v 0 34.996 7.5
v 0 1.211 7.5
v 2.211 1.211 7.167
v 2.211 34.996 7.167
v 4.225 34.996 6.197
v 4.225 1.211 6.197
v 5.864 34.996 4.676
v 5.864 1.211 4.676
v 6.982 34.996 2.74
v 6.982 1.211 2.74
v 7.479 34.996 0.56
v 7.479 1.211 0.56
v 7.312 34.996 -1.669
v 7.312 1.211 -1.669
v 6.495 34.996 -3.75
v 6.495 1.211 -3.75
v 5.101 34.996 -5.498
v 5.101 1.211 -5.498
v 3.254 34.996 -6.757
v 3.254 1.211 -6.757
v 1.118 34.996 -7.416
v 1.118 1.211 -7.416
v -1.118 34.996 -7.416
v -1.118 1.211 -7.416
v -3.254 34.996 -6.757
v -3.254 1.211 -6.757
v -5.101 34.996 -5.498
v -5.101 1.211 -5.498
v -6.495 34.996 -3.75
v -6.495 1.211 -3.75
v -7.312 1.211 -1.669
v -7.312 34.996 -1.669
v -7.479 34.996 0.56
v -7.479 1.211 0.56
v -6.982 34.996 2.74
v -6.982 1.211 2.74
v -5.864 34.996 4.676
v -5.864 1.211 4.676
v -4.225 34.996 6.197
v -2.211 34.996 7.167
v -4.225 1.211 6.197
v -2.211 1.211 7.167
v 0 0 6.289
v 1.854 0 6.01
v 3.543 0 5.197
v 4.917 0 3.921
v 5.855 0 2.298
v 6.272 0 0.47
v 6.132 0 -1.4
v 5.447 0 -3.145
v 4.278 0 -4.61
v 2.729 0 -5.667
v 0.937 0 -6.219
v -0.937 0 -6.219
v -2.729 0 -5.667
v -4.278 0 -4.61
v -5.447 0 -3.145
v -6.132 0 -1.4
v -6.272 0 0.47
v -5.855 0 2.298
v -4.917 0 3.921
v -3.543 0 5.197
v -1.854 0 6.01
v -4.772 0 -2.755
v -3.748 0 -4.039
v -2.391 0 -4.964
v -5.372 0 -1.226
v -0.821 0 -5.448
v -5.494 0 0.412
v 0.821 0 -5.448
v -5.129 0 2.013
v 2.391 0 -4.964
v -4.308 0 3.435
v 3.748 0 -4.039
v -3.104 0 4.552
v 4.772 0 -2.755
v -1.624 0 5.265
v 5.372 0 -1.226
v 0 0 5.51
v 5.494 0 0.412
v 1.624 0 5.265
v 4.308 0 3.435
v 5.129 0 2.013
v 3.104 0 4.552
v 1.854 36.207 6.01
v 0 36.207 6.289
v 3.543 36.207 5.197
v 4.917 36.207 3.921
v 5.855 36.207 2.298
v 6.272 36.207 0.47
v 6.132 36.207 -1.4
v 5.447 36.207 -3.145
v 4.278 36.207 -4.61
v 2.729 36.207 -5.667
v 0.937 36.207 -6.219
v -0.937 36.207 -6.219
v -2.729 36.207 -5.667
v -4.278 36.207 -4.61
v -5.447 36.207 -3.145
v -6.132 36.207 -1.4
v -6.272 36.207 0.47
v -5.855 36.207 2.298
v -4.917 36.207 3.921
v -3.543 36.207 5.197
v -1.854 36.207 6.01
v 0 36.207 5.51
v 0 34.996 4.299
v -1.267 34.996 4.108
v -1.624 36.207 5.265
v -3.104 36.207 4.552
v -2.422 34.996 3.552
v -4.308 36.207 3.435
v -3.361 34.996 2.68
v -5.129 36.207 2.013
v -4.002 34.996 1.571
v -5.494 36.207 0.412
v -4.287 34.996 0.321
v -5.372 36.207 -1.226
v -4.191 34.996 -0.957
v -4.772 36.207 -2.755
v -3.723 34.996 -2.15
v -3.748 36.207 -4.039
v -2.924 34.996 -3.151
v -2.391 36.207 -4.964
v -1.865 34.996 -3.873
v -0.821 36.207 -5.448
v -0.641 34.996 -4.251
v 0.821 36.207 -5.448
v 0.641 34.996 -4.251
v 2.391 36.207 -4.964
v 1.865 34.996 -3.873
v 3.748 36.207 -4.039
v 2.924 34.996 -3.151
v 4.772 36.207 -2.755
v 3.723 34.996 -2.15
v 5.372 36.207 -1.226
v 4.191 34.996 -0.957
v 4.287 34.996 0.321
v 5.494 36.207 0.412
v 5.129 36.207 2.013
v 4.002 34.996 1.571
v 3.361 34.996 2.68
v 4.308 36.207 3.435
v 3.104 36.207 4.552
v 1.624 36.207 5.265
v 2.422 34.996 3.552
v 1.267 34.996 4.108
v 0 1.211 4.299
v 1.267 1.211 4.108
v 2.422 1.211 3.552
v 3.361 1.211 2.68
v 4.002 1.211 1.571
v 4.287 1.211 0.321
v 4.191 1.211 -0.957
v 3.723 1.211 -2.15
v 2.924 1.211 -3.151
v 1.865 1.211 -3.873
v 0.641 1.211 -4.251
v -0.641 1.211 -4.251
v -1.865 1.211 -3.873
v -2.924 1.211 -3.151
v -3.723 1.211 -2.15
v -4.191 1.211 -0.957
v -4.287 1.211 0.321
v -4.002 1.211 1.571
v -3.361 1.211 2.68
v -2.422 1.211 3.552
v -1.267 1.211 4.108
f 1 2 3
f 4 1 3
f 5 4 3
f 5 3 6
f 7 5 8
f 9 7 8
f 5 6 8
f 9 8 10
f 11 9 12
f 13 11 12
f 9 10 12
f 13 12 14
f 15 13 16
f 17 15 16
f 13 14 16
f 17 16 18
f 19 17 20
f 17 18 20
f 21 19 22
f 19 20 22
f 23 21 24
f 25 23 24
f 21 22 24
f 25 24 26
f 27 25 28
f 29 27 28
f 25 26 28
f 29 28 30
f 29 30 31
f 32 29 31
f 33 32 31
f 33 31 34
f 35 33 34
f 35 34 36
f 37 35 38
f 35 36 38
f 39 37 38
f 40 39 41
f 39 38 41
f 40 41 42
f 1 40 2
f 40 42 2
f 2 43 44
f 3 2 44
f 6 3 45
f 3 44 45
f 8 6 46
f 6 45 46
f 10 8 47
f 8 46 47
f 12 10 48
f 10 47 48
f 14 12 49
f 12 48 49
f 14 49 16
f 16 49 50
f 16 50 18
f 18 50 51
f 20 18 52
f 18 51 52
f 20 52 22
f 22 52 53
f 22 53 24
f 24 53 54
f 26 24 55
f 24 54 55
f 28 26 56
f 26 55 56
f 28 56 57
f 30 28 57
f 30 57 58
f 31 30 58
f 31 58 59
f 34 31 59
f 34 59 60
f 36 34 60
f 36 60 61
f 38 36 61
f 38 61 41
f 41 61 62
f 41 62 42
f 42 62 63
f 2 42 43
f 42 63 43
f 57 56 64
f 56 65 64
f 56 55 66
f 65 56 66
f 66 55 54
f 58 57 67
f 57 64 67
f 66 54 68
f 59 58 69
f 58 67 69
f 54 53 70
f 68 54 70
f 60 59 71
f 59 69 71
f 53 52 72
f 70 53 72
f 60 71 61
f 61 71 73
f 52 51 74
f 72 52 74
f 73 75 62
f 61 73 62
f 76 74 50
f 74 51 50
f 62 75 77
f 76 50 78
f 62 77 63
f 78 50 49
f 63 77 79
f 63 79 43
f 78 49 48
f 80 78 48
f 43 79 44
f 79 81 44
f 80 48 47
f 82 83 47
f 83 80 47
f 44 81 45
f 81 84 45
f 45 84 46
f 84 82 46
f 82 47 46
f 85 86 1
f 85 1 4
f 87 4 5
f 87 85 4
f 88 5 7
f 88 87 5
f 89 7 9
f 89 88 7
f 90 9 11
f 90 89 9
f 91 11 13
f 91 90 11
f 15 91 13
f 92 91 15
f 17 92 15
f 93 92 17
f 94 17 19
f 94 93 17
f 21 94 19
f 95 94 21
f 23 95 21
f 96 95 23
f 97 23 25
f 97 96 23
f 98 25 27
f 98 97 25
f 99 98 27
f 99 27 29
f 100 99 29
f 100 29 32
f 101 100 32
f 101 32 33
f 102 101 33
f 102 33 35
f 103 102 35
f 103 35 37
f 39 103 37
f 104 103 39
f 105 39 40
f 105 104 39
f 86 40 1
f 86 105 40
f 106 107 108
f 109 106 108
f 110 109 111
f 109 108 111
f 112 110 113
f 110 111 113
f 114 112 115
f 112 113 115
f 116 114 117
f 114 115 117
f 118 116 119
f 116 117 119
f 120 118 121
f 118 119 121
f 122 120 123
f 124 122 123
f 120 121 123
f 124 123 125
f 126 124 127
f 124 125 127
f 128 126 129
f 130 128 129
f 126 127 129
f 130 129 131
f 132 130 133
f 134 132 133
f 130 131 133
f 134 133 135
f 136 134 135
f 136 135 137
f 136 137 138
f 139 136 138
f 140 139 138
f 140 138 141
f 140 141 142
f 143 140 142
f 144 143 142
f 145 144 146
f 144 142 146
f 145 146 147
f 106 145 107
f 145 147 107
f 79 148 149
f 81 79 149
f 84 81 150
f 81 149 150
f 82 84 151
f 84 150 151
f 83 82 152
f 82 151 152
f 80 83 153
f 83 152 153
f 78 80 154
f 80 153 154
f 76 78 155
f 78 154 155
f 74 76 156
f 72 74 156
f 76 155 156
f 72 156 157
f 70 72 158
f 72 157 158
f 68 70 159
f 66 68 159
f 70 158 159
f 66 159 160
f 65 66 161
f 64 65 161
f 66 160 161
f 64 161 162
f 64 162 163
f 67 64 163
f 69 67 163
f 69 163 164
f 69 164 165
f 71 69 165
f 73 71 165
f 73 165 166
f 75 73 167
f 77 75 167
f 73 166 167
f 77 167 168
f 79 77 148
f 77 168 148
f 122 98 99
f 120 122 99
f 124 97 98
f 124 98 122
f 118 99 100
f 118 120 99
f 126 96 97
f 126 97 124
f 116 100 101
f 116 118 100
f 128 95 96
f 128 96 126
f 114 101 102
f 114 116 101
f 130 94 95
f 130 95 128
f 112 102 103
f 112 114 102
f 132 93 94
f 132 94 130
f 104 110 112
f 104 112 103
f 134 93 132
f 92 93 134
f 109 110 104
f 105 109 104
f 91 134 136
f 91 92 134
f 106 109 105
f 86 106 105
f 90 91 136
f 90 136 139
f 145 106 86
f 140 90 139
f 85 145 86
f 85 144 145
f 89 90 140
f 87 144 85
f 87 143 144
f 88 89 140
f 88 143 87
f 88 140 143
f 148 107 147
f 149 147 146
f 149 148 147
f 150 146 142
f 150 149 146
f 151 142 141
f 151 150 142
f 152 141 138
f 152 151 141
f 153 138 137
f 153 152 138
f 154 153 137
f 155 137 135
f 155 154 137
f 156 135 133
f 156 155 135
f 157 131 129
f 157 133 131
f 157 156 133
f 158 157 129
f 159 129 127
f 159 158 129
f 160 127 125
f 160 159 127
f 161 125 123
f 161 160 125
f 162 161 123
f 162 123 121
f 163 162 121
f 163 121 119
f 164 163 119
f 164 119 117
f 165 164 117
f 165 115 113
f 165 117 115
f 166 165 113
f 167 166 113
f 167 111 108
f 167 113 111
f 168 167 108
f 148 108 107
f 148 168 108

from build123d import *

# Parameters (mm, degrees)
SKETCH1_R           = 7.5
BOSS_EXTRUDE1_DEPTH = 36.206883899
SKETCH2_R           = 4.299113173
CUT_EXTRUDE1_DEPTH  = 38.728483161
CHAMFER1_SIZE       = 1.210647009


with BuildPart() as part:
    # Sketch1 → Boss-Extrude1 (new body)
    with BuildSketch(Plane(origin=(0, 0, 0), x_dir=(1, 0, 0), z_dir=(0, 1, 0))):
        Circle(SKETCH1_R)
    extrude(amount=BOSS_EXTRUDE1_DEPTH)

    # Sketch2 → Cut-Extrude1 (cut, through all)
    with BuildSketch(Plane(origin=(0, 0, 0), x_dir=(1, 0, 0), z_dir=(0, 1, 0))):
        Circle(SKETCH2_R)
    extrude(amount=CUT_EXTRUDE1_DEPTH, mode=Mode.SUBTRACT)

    # Chamfer1
    chamfer1_edges = [part.edges().sort_by_distance(p)[0] for p in [
        (-4.299113173, 36.206883899, 0),
        (-4.299113173, 0, 0),
        (-7.5, 0, 0),
        (-7.5, 36.206883899, 0),
    ]]
    chamfer(chamfer1_edges, length=CHAMFER1_SIZE)


solid = part.part
